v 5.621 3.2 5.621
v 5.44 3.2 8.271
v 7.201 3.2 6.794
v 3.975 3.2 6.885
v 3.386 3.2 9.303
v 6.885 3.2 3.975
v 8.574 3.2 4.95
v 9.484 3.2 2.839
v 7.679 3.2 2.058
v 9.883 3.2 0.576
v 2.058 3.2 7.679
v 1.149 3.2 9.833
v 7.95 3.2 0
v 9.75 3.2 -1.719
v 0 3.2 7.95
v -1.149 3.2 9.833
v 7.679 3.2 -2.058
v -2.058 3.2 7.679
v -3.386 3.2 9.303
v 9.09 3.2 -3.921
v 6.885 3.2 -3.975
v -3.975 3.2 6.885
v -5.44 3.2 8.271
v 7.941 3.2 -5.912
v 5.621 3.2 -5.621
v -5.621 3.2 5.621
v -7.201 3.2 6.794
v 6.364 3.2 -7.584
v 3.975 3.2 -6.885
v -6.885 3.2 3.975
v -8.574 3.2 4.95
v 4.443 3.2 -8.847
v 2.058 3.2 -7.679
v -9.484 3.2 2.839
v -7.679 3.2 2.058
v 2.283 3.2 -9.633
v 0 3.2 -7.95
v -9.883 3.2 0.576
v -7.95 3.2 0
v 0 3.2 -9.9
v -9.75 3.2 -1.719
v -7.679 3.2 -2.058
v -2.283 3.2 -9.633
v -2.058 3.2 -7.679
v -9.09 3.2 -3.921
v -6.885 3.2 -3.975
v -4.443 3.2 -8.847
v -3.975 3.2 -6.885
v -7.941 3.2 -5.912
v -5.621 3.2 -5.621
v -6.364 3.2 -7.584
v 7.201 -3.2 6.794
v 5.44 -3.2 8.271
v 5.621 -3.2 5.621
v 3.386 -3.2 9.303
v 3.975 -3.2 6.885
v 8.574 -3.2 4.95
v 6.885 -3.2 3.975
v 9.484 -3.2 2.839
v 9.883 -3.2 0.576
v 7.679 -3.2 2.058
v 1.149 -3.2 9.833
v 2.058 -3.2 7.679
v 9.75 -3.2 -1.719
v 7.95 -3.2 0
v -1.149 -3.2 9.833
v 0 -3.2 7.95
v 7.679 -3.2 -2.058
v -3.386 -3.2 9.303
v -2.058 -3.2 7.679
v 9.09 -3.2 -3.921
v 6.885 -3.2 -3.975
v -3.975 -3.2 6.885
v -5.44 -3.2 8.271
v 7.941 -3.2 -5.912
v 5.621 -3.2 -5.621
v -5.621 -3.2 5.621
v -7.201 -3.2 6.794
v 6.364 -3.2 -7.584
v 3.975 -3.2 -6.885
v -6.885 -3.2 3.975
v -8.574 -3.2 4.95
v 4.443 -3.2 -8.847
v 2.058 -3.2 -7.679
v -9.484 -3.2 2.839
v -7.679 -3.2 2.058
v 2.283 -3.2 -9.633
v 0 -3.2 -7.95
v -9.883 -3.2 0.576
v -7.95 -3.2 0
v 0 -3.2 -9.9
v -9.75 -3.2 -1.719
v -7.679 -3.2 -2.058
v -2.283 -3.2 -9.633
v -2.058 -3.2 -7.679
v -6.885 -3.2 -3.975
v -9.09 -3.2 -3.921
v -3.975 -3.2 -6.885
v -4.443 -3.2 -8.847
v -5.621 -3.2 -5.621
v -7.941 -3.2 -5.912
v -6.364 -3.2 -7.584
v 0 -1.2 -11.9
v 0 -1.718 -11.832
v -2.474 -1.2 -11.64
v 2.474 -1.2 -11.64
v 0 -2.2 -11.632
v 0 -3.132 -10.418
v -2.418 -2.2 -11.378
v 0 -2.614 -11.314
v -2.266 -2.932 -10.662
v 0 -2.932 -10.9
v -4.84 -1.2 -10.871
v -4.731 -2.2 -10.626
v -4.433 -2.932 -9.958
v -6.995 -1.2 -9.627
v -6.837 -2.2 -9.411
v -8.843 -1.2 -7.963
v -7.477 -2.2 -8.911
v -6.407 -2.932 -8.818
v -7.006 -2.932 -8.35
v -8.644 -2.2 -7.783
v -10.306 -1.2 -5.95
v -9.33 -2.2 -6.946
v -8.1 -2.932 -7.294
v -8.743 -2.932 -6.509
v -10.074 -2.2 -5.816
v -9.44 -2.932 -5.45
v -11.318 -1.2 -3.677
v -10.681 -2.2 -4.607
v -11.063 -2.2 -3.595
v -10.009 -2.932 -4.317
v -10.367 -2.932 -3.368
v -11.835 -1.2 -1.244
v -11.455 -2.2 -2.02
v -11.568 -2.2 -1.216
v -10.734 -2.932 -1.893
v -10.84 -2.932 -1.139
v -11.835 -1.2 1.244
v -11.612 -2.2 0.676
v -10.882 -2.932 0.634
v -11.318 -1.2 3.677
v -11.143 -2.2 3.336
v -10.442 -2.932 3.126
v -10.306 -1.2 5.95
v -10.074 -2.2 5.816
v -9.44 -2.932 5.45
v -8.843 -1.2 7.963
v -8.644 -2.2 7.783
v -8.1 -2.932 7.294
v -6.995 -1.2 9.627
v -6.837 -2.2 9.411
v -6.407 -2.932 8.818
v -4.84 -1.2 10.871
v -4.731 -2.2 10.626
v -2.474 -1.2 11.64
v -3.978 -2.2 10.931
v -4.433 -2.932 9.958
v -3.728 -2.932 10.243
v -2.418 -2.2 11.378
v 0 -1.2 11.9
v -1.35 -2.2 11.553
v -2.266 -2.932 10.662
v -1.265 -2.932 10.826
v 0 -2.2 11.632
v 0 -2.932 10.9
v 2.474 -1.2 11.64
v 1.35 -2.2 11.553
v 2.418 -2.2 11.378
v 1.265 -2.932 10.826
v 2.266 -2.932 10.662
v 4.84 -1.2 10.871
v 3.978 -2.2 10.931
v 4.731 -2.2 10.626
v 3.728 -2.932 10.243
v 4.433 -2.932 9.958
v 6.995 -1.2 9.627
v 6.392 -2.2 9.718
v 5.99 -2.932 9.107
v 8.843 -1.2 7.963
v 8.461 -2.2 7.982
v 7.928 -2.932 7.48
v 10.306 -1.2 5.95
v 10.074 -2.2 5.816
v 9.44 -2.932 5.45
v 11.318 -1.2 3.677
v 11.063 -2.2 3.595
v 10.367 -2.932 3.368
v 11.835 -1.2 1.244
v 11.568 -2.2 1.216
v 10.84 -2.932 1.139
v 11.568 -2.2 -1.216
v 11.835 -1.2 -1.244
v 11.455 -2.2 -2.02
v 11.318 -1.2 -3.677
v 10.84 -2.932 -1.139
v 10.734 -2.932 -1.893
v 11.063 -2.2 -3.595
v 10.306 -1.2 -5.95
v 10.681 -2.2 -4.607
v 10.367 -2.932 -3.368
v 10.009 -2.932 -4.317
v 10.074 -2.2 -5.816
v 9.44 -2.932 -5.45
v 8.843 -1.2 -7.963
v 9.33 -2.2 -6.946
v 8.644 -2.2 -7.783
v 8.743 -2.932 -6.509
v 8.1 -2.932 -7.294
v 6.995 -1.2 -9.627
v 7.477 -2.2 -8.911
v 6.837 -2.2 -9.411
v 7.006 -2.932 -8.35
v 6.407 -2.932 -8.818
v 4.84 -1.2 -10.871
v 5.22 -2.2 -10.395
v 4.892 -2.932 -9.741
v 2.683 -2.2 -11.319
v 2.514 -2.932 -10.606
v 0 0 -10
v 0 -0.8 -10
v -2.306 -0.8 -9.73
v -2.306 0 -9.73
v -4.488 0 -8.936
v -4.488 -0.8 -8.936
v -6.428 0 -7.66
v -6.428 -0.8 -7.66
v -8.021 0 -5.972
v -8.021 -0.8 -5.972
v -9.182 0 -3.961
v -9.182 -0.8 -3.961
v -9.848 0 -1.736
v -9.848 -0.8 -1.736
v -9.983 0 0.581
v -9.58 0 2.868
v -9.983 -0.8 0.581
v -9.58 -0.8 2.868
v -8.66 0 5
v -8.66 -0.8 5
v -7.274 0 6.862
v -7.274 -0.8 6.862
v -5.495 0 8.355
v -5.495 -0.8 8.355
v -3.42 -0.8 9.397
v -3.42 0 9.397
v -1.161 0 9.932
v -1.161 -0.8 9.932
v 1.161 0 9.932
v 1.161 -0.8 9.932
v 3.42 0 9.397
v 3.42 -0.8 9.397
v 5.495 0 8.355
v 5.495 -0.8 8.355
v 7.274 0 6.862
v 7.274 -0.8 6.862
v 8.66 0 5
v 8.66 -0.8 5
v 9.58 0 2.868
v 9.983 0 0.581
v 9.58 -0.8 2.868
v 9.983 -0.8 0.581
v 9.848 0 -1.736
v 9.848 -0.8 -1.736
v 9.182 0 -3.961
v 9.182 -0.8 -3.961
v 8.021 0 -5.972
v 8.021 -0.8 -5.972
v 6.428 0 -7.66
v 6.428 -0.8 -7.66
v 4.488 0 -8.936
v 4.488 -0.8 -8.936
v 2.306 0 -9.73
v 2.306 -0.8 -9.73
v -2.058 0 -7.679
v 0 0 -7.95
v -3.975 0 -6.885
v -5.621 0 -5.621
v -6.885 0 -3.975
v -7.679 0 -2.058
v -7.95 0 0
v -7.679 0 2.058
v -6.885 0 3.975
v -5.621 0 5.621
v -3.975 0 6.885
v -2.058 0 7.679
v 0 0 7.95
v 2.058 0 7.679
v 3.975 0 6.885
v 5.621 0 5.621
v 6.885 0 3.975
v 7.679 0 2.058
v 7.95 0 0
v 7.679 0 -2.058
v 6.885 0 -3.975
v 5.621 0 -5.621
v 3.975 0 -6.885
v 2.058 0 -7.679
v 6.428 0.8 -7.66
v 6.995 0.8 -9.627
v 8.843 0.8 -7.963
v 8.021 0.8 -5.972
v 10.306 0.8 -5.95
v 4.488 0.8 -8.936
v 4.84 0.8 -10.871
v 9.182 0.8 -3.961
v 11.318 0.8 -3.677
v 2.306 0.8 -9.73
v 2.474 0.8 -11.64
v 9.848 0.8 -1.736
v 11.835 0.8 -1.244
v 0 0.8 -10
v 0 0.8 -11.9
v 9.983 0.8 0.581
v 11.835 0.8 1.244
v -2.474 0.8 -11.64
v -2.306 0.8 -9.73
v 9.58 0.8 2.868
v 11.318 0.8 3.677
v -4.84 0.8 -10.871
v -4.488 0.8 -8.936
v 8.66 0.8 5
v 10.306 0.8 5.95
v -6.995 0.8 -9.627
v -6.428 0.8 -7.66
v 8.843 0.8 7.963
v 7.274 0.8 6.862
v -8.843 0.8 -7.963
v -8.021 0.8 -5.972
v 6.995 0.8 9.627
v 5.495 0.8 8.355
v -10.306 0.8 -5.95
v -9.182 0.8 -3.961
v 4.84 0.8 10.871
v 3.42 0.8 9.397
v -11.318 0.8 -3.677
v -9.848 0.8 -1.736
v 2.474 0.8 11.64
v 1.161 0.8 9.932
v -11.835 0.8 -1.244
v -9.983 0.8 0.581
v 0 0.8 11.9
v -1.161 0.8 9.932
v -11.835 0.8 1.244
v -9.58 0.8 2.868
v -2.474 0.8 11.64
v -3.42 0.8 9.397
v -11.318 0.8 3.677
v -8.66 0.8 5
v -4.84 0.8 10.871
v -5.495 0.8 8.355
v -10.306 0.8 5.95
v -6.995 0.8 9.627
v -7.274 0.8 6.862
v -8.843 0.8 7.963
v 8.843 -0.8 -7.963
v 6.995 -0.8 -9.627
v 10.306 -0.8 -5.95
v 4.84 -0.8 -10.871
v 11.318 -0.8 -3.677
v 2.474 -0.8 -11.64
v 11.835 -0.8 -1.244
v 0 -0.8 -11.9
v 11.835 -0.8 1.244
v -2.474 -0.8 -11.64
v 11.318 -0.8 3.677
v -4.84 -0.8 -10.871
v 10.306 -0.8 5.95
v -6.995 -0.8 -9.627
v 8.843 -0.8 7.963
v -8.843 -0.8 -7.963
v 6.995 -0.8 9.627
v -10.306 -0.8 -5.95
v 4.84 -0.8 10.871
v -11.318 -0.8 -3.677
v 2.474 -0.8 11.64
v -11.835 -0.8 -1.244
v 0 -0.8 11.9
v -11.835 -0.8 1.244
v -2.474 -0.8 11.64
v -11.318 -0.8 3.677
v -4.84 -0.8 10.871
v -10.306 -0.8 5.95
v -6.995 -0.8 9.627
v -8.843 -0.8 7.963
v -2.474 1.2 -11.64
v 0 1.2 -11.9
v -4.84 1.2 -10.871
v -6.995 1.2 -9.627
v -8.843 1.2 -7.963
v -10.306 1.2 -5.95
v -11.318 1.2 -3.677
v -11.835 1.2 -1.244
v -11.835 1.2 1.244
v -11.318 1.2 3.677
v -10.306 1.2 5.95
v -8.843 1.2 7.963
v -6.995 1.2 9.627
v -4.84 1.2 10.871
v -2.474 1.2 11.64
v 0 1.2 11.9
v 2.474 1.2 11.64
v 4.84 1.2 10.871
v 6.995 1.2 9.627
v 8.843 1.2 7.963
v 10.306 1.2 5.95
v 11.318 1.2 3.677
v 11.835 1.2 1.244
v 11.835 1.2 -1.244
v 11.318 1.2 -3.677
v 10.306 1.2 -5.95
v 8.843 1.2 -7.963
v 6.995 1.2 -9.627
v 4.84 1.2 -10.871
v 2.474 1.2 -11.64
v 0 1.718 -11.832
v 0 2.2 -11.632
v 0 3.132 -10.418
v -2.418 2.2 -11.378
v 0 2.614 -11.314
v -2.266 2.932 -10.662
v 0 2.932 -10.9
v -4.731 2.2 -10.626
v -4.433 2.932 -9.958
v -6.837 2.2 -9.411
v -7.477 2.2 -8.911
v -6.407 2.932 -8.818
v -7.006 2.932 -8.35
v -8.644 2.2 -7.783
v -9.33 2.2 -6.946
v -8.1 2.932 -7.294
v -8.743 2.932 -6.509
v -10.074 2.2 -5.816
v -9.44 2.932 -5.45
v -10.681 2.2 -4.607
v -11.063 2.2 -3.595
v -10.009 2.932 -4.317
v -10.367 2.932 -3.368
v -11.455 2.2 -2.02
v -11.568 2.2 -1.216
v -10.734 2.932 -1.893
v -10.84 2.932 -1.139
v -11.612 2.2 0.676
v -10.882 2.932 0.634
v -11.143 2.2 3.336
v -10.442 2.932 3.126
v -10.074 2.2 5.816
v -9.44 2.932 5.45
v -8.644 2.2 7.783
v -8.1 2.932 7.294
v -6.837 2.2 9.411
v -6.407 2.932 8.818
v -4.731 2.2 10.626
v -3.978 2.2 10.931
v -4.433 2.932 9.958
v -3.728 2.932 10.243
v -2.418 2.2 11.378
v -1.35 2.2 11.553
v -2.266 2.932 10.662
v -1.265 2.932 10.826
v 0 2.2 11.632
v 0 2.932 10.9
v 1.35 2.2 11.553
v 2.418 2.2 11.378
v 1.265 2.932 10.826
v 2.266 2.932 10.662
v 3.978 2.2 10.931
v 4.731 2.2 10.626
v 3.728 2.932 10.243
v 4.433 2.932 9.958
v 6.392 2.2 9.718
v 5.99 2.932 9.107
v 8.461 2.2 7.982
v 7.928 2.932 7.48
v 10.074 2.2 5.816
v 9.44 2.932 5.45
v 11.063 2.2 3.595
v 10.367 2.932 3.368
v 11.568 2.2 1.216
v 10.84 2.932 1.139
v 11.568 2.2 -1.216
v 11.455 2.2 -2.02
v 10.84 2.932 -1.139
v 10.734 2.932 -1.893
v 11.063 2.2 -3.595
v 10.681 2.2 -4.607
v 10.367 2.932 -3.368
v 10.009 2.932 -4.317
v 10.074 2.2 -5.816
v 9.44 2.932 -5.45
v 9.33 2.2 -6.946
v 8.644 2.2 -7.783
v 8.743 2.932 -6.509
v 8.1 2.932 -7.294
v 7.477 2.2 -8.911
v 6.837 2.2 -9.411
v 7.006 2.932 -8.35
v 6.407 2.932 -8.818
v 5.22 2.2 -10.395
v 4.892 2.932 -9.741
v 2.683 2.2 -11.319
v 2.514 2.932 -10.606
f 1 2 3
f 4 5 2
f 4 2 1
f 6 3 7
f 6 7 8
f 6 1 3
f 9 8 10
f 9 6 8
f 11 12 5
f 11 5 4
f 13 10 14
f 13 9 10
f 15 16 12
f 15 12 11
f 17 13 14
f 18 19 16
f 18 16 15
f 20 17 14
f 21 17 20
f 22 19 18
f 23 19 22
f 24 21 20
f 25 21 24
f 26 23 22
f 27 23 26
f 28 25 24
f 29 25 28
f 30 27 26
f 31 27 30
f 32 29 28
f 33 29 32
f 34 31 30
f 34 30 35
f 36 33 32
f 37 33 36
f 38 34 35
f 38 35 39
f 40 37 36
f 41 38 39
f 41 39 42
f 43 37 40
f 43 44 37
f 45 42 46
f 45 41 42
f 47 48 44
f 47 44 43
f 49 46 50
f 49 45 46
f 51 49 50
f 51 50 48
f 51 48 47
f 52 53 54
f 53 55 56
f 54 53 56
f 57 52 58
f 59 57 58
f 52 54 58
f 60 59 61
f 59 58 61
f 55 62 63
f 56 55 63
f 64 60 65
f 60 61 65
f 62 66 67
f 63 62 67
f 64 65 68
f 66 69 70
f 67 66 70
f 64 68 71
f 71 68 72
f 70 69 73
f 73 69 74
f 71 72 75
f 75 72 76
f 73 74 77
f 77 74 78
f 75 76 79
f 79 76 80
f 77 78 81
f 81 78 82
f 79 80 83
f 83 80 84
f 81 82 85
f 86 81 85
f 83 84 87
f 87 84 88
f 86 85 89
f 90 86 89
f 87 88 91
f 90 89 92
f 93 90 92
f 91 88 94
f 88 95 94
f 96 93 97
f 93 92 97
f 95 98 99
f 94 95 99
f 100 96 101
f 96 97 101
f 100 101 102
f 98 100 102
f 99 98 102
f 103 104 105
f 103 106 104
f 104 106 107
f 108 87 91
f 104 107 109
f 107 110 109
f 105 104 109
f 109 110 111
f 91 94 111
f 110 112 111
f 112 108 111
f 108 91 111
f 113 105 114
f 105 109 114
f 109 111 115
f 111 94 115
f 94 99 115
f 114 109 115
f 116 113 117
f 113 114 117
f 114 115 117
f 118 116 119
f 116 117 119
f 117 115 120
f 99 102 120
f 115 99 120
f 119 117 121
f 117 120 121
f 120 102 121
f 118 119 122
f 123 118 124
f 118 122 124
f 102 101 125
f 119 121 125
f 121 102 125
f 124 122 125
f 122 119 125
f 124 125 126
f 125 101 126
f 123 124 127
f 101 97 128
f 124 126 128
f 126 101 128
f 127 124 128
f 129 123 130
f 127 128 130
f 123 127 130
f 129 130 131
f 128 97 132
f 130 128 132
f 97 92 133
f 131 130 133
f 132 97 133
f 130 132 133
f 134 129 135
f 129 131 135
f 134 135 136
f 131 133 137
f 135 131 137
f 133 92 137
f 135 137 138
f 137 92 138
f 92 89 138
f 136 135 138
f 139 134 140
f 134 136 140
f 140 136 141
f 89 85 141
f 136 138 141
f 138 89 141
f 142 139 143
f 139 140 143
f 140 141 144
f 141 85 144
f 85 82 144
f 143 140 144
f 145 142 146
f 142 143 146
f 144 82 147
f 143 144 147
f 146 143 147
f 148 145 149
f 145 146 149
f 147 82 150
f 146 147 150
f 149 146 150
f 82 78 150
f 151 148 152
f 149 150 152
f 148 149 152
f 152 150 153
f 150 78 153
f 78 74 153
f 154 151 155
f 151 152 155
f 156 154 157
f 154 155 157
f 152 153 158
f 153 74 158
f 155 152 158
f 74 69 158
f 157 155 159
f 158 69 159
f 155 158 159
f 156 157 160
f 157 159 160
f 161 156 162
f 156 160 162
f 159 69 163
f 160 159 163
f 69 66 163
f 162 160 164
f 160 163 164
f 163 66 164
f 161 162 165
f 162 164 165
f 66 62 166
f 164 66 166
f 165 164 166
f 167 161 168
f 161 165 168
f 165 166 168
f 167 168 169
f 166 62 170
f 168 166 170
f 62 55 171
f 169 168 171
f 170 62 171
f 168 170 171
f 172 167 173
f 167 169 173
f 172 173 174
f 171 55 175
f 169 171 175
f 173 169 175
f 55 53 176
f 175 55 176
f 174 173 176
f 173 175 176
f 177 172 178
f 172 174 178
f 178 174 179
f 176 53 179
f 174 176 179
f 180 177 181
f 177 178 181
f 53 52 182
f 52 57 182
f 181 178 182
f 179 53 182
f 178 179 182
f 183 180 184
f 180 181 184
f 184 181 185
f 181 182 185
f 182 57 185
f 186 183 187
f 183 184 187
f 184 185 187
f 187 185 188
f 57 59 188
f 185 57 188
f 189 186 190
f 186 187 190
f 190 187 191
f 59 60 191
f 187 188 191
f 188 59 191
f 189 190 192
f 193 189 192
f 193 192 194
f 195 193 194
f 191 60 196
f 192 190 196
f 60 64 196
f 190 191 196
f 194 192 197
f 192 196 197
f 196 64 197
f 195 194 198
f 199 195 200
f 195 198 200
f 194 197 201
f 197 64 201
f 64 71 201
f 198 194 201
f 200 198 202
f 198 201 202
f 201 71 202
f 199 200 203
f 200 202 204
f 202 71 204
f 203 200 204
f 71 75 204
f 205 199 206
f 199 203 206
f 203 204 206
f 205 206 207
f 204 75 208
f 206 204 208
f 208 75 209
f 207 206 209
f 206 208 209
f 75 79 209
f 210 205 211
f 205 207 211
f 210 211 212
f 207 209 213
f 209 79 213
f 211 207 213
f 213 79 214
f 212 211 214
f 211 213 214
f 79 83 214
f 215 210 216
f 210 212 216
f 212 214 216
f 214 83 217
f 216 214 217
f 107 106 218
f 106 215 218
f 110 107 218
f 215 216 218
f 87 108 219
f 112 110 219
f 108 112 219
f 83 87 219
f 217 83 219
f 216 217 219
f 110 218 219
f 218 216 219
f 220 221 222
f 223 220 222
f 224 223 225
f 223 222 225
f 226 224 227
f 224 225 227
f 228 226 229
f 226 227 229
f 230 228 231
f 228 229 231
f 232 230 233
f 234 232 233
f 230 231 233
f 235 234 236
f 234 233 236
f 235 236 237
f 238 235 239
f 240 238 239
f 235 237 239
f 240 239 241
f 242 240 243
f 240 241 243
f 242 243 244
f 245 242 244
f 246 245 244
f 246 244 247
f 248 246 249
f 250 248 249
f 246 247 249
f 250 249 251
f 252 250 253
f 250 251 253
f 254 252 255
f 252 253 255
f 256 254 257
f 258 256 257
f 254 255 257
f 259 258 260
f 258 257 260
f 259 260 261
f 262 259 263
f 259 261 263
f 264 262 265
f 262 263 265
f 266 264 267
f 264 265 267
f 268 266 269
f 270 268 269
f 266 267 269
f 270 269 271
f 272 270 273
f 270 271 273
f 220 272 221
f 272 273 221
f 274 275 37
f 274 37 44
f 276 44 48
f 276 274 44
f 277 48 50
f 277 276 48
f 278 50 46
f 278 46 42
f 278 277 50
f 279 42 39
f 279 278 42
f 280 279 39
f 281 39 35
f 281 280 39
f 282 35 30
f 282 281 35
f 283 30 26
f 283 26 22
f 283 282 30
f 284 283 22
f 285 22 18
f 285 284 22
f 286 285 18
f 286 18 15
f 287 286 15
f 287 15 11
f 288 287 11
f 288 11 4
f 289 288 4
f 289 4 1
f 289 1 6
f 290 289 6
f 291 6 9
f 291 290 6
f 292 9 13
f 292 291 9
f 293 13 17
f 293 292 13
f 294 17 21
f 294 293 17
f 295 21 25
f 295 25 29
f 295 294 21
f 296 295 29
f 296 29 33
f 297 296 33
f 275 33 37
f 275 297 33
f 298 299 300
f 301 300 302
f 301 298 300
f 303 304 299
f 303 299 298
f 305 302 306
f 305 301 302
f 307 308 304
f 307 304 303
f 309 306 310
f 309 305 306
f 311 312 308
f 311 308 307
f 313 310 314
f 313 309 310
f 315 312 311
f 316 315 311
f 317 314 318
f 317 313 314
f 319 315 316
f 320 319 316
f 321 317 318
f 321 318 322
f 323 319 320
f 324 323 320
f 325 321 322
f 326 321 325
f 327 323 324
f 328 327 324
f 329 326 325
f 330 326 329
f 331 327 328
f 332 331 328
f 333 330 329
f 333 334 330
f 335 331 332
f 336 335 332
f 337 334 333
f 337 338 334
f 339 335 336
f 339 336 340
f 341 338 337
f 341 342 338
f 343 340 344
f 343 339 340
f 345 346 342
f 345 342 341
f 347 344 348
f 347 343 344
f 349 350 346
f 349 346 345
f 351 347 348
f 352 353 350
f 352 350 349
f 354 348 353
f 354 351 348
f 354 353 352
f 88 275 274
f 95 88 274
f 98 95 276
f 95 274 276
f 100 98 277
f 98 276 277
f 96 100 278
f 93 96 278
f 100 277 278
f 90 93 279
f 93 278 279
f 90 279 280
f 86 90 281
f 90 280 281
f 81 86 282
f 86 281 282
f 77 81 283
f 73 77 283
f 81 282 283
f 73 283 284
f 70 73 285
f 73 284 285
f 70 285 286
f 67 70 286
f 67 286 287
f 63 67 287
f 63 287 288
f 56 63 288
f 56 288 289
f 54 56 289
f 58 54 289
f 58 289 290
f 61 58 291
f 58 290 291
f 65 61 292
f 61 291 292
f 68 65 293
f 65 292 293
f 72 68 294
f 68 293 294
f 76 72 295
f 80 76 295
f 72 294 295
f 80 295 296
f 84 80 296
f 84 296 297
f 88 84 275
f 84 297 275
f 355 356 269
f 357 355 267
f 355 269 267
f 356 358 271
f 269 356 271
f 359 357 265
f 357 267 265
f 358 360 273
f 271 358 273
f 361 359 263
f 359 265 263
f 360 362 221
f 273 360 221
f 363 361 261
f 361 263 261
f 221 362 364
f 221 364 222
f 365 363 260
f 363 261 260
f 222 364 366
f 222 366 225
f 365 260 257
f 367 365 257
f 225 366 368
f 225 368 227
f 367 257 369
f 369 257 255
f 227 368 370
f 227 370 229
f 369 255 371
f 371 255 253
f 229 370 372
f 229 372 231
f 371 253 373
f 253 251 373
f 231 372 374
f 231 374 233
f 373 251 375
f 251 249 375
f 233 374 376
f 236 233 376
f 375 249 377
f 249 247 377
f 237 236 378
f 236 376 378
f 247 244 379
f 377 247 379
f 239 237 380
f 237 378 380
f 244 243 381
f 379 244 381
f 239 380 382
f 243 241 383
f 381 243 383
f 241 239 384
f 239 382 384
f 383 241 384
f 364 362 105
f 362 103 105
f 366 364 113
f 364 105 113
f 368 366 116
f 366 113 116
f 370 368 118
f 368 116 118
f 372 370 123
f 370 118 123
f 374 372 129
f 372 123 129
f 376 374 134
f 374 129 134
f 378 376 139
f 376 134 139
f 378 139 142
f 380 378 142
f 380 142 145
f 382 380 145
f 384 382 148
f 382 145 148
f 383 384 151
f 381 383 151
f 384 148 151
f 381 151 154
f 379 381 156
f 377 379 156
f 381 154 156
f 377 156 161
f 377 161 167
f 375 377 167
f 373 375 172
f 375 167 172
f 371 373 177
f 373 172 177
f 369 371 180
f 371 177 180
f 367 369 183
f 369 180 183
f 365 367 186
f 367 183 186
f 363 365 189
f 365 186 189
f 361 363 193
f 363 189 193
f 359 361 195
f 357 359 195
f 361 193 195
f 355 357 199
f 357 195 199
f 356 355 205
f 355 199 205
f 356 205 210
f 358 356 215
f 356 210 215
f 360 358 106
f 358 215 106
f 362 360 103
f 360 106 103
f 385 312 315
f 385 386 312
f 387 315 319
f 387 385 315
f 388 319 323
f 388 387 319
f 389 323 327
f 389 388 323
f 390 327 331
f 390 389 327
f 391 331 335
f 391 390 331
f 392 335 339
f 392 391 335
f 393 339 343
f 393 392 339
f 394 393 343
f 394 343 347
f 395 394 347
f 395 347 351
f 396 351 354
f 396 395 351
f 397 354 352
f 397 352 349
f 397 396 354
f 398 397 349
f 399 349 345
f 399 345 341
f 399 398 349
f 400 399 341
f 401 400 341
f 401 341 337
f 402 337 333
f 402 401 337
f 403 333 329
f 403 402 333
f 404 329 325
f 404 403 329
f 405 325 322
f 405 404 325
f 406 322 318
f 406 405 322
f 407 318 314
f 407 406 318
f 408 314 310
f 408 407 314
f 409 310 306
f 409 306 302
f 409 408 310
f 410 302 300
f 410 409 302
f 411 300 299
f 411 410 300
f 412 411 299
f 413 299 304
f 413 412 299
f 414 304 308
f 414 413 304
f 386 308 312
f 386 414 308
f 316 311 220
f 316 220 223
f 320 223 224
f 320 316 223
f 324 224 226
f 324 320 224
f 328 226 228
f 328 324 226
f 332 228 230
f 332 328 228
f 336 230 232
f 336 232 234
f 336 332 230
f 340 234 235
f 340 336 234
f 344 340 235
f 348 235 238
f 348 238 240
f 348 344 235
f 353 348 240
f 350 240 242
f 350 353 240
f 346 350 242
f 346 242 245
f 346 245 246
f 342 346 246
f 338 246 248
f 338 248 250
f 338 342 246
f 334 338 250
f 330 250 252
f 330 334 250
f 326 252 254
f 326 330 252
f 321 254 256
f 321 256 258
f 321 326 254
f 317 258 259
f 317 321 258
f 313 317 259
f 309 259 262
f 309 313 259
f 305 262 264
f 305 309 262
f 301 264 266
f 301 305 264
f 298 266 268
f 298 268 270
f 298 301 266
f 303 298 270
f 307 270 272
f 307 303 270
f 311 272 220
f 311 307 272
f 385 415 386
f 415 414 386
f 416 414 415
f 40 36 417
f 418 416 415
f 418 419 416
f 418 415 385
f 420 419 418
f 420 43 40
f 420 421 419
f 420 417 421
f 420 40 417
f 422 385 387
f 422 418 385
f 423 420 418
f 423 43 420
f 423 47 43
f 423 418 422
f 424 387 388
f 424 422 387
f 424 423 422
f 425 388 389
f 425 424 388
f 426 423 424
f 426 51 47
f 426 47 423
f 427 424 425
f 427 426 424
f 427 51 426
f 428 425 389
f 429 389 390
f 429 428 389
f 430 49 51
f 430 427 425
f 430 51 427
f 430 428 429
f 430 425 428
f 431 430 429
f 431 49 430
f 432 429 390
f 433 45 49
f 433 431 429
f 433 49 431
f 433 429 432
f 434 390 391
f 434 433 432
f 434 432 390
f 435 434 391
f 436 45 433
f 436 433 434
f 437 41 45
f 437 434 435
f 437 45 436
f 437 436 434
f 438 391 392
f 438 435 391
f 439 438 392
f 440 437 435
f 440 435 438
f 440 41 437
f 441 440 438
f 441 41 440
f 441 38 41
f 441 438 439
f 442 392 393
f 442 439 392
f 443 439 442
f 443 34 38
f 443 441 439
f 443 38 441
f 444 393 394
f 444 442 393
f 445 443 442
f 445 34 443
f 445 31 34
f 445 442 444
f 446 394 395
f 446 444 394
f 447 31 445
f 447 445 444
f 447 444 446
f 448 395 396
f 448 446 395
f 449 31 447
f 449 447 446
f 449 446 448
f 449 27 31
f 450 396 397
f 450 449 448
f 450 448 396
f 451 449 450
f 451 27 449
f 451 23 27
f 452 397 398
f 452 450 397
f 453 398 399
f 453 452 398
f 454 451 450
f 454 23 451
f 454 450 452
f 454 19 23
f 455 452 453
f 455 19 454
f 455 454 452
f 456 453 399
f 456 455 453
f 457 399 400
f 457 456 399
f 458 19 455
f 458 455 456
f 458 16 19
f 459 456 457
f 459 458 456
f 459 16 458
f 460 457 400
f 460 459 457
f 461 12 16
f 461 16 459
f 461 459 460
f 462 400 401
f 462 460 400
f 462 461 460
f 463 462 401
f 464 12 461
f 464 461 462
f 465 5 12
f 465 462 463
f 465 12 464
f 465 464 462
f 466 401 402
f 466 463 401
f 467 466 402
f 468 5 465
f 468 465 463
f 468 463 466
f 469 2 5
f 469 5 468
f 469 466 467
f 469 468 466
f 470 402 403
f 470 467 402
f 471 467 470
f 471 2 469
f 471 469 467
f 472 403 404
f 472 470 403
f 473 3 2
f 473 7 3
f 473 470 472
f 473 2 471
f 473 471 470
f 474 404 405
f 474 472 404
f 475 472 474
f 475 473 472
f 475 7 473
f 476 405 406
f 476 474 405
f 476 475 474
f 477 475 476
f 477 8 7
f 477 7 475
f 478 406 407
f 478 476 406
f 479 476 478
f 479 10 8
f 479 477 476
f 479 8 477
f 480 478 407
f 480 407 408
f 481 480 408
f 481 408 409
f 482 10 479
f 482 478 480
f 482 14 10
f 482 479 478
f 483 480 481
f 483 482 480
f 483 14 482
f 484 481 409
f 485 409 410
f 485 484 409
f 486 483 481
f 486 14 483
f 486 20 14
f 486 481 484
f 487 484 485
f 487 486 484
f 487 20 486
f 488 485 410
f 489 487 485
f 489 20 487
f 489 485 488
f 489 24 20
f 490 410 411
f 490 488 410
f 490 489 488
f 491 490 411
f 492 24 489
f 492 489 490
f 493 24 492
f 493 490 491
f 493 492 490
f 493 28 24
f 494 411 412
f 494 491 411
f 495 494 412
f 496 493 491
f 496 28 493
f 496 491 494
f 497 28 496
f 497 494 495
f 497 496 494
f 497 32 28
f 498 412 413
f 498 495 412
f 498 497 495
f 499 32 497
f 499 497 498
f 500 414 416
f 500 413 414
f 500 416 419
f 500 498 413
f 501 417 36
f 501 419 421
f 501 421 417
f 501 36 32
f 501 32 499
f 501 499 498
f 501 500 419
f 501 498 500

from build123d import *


with BuildPart() as part:
    # Esquisse2 → Révolution1 (revolve)
    with BuildSketch(Plane.XY, mode=Mode.PRIVATE) as r_volution1_sk:
        with BuildLine():
            Line((7.95, 3.2), (7.95, 0))
            Line((7.95, 0), (10, 0))
            Line((10, 0), (10, 0.8))
            Line((10, 0.8), (11.9, 0.8))
            Line((11.9, 0.8), (11.9, 1.2))
            ThreePointArc((11.9, 1.2), (11.314213562, 2.614213562), (9.9, 3.2))
            Line((9.9, 3.2), (7.95, 3.2))
        make_face()
    r_volution1 = revolve(r_volution1_sk.sketch.rotate(Axis((0, 0, 0), (0, 1, 0)), 90), axis=Axis((0, 0, 0), (0, 1, 0)))

    # Symétrie1: Révolution1 across plane
    add(r_volution1.mirror(Plane.ZX))


solid = part.part
